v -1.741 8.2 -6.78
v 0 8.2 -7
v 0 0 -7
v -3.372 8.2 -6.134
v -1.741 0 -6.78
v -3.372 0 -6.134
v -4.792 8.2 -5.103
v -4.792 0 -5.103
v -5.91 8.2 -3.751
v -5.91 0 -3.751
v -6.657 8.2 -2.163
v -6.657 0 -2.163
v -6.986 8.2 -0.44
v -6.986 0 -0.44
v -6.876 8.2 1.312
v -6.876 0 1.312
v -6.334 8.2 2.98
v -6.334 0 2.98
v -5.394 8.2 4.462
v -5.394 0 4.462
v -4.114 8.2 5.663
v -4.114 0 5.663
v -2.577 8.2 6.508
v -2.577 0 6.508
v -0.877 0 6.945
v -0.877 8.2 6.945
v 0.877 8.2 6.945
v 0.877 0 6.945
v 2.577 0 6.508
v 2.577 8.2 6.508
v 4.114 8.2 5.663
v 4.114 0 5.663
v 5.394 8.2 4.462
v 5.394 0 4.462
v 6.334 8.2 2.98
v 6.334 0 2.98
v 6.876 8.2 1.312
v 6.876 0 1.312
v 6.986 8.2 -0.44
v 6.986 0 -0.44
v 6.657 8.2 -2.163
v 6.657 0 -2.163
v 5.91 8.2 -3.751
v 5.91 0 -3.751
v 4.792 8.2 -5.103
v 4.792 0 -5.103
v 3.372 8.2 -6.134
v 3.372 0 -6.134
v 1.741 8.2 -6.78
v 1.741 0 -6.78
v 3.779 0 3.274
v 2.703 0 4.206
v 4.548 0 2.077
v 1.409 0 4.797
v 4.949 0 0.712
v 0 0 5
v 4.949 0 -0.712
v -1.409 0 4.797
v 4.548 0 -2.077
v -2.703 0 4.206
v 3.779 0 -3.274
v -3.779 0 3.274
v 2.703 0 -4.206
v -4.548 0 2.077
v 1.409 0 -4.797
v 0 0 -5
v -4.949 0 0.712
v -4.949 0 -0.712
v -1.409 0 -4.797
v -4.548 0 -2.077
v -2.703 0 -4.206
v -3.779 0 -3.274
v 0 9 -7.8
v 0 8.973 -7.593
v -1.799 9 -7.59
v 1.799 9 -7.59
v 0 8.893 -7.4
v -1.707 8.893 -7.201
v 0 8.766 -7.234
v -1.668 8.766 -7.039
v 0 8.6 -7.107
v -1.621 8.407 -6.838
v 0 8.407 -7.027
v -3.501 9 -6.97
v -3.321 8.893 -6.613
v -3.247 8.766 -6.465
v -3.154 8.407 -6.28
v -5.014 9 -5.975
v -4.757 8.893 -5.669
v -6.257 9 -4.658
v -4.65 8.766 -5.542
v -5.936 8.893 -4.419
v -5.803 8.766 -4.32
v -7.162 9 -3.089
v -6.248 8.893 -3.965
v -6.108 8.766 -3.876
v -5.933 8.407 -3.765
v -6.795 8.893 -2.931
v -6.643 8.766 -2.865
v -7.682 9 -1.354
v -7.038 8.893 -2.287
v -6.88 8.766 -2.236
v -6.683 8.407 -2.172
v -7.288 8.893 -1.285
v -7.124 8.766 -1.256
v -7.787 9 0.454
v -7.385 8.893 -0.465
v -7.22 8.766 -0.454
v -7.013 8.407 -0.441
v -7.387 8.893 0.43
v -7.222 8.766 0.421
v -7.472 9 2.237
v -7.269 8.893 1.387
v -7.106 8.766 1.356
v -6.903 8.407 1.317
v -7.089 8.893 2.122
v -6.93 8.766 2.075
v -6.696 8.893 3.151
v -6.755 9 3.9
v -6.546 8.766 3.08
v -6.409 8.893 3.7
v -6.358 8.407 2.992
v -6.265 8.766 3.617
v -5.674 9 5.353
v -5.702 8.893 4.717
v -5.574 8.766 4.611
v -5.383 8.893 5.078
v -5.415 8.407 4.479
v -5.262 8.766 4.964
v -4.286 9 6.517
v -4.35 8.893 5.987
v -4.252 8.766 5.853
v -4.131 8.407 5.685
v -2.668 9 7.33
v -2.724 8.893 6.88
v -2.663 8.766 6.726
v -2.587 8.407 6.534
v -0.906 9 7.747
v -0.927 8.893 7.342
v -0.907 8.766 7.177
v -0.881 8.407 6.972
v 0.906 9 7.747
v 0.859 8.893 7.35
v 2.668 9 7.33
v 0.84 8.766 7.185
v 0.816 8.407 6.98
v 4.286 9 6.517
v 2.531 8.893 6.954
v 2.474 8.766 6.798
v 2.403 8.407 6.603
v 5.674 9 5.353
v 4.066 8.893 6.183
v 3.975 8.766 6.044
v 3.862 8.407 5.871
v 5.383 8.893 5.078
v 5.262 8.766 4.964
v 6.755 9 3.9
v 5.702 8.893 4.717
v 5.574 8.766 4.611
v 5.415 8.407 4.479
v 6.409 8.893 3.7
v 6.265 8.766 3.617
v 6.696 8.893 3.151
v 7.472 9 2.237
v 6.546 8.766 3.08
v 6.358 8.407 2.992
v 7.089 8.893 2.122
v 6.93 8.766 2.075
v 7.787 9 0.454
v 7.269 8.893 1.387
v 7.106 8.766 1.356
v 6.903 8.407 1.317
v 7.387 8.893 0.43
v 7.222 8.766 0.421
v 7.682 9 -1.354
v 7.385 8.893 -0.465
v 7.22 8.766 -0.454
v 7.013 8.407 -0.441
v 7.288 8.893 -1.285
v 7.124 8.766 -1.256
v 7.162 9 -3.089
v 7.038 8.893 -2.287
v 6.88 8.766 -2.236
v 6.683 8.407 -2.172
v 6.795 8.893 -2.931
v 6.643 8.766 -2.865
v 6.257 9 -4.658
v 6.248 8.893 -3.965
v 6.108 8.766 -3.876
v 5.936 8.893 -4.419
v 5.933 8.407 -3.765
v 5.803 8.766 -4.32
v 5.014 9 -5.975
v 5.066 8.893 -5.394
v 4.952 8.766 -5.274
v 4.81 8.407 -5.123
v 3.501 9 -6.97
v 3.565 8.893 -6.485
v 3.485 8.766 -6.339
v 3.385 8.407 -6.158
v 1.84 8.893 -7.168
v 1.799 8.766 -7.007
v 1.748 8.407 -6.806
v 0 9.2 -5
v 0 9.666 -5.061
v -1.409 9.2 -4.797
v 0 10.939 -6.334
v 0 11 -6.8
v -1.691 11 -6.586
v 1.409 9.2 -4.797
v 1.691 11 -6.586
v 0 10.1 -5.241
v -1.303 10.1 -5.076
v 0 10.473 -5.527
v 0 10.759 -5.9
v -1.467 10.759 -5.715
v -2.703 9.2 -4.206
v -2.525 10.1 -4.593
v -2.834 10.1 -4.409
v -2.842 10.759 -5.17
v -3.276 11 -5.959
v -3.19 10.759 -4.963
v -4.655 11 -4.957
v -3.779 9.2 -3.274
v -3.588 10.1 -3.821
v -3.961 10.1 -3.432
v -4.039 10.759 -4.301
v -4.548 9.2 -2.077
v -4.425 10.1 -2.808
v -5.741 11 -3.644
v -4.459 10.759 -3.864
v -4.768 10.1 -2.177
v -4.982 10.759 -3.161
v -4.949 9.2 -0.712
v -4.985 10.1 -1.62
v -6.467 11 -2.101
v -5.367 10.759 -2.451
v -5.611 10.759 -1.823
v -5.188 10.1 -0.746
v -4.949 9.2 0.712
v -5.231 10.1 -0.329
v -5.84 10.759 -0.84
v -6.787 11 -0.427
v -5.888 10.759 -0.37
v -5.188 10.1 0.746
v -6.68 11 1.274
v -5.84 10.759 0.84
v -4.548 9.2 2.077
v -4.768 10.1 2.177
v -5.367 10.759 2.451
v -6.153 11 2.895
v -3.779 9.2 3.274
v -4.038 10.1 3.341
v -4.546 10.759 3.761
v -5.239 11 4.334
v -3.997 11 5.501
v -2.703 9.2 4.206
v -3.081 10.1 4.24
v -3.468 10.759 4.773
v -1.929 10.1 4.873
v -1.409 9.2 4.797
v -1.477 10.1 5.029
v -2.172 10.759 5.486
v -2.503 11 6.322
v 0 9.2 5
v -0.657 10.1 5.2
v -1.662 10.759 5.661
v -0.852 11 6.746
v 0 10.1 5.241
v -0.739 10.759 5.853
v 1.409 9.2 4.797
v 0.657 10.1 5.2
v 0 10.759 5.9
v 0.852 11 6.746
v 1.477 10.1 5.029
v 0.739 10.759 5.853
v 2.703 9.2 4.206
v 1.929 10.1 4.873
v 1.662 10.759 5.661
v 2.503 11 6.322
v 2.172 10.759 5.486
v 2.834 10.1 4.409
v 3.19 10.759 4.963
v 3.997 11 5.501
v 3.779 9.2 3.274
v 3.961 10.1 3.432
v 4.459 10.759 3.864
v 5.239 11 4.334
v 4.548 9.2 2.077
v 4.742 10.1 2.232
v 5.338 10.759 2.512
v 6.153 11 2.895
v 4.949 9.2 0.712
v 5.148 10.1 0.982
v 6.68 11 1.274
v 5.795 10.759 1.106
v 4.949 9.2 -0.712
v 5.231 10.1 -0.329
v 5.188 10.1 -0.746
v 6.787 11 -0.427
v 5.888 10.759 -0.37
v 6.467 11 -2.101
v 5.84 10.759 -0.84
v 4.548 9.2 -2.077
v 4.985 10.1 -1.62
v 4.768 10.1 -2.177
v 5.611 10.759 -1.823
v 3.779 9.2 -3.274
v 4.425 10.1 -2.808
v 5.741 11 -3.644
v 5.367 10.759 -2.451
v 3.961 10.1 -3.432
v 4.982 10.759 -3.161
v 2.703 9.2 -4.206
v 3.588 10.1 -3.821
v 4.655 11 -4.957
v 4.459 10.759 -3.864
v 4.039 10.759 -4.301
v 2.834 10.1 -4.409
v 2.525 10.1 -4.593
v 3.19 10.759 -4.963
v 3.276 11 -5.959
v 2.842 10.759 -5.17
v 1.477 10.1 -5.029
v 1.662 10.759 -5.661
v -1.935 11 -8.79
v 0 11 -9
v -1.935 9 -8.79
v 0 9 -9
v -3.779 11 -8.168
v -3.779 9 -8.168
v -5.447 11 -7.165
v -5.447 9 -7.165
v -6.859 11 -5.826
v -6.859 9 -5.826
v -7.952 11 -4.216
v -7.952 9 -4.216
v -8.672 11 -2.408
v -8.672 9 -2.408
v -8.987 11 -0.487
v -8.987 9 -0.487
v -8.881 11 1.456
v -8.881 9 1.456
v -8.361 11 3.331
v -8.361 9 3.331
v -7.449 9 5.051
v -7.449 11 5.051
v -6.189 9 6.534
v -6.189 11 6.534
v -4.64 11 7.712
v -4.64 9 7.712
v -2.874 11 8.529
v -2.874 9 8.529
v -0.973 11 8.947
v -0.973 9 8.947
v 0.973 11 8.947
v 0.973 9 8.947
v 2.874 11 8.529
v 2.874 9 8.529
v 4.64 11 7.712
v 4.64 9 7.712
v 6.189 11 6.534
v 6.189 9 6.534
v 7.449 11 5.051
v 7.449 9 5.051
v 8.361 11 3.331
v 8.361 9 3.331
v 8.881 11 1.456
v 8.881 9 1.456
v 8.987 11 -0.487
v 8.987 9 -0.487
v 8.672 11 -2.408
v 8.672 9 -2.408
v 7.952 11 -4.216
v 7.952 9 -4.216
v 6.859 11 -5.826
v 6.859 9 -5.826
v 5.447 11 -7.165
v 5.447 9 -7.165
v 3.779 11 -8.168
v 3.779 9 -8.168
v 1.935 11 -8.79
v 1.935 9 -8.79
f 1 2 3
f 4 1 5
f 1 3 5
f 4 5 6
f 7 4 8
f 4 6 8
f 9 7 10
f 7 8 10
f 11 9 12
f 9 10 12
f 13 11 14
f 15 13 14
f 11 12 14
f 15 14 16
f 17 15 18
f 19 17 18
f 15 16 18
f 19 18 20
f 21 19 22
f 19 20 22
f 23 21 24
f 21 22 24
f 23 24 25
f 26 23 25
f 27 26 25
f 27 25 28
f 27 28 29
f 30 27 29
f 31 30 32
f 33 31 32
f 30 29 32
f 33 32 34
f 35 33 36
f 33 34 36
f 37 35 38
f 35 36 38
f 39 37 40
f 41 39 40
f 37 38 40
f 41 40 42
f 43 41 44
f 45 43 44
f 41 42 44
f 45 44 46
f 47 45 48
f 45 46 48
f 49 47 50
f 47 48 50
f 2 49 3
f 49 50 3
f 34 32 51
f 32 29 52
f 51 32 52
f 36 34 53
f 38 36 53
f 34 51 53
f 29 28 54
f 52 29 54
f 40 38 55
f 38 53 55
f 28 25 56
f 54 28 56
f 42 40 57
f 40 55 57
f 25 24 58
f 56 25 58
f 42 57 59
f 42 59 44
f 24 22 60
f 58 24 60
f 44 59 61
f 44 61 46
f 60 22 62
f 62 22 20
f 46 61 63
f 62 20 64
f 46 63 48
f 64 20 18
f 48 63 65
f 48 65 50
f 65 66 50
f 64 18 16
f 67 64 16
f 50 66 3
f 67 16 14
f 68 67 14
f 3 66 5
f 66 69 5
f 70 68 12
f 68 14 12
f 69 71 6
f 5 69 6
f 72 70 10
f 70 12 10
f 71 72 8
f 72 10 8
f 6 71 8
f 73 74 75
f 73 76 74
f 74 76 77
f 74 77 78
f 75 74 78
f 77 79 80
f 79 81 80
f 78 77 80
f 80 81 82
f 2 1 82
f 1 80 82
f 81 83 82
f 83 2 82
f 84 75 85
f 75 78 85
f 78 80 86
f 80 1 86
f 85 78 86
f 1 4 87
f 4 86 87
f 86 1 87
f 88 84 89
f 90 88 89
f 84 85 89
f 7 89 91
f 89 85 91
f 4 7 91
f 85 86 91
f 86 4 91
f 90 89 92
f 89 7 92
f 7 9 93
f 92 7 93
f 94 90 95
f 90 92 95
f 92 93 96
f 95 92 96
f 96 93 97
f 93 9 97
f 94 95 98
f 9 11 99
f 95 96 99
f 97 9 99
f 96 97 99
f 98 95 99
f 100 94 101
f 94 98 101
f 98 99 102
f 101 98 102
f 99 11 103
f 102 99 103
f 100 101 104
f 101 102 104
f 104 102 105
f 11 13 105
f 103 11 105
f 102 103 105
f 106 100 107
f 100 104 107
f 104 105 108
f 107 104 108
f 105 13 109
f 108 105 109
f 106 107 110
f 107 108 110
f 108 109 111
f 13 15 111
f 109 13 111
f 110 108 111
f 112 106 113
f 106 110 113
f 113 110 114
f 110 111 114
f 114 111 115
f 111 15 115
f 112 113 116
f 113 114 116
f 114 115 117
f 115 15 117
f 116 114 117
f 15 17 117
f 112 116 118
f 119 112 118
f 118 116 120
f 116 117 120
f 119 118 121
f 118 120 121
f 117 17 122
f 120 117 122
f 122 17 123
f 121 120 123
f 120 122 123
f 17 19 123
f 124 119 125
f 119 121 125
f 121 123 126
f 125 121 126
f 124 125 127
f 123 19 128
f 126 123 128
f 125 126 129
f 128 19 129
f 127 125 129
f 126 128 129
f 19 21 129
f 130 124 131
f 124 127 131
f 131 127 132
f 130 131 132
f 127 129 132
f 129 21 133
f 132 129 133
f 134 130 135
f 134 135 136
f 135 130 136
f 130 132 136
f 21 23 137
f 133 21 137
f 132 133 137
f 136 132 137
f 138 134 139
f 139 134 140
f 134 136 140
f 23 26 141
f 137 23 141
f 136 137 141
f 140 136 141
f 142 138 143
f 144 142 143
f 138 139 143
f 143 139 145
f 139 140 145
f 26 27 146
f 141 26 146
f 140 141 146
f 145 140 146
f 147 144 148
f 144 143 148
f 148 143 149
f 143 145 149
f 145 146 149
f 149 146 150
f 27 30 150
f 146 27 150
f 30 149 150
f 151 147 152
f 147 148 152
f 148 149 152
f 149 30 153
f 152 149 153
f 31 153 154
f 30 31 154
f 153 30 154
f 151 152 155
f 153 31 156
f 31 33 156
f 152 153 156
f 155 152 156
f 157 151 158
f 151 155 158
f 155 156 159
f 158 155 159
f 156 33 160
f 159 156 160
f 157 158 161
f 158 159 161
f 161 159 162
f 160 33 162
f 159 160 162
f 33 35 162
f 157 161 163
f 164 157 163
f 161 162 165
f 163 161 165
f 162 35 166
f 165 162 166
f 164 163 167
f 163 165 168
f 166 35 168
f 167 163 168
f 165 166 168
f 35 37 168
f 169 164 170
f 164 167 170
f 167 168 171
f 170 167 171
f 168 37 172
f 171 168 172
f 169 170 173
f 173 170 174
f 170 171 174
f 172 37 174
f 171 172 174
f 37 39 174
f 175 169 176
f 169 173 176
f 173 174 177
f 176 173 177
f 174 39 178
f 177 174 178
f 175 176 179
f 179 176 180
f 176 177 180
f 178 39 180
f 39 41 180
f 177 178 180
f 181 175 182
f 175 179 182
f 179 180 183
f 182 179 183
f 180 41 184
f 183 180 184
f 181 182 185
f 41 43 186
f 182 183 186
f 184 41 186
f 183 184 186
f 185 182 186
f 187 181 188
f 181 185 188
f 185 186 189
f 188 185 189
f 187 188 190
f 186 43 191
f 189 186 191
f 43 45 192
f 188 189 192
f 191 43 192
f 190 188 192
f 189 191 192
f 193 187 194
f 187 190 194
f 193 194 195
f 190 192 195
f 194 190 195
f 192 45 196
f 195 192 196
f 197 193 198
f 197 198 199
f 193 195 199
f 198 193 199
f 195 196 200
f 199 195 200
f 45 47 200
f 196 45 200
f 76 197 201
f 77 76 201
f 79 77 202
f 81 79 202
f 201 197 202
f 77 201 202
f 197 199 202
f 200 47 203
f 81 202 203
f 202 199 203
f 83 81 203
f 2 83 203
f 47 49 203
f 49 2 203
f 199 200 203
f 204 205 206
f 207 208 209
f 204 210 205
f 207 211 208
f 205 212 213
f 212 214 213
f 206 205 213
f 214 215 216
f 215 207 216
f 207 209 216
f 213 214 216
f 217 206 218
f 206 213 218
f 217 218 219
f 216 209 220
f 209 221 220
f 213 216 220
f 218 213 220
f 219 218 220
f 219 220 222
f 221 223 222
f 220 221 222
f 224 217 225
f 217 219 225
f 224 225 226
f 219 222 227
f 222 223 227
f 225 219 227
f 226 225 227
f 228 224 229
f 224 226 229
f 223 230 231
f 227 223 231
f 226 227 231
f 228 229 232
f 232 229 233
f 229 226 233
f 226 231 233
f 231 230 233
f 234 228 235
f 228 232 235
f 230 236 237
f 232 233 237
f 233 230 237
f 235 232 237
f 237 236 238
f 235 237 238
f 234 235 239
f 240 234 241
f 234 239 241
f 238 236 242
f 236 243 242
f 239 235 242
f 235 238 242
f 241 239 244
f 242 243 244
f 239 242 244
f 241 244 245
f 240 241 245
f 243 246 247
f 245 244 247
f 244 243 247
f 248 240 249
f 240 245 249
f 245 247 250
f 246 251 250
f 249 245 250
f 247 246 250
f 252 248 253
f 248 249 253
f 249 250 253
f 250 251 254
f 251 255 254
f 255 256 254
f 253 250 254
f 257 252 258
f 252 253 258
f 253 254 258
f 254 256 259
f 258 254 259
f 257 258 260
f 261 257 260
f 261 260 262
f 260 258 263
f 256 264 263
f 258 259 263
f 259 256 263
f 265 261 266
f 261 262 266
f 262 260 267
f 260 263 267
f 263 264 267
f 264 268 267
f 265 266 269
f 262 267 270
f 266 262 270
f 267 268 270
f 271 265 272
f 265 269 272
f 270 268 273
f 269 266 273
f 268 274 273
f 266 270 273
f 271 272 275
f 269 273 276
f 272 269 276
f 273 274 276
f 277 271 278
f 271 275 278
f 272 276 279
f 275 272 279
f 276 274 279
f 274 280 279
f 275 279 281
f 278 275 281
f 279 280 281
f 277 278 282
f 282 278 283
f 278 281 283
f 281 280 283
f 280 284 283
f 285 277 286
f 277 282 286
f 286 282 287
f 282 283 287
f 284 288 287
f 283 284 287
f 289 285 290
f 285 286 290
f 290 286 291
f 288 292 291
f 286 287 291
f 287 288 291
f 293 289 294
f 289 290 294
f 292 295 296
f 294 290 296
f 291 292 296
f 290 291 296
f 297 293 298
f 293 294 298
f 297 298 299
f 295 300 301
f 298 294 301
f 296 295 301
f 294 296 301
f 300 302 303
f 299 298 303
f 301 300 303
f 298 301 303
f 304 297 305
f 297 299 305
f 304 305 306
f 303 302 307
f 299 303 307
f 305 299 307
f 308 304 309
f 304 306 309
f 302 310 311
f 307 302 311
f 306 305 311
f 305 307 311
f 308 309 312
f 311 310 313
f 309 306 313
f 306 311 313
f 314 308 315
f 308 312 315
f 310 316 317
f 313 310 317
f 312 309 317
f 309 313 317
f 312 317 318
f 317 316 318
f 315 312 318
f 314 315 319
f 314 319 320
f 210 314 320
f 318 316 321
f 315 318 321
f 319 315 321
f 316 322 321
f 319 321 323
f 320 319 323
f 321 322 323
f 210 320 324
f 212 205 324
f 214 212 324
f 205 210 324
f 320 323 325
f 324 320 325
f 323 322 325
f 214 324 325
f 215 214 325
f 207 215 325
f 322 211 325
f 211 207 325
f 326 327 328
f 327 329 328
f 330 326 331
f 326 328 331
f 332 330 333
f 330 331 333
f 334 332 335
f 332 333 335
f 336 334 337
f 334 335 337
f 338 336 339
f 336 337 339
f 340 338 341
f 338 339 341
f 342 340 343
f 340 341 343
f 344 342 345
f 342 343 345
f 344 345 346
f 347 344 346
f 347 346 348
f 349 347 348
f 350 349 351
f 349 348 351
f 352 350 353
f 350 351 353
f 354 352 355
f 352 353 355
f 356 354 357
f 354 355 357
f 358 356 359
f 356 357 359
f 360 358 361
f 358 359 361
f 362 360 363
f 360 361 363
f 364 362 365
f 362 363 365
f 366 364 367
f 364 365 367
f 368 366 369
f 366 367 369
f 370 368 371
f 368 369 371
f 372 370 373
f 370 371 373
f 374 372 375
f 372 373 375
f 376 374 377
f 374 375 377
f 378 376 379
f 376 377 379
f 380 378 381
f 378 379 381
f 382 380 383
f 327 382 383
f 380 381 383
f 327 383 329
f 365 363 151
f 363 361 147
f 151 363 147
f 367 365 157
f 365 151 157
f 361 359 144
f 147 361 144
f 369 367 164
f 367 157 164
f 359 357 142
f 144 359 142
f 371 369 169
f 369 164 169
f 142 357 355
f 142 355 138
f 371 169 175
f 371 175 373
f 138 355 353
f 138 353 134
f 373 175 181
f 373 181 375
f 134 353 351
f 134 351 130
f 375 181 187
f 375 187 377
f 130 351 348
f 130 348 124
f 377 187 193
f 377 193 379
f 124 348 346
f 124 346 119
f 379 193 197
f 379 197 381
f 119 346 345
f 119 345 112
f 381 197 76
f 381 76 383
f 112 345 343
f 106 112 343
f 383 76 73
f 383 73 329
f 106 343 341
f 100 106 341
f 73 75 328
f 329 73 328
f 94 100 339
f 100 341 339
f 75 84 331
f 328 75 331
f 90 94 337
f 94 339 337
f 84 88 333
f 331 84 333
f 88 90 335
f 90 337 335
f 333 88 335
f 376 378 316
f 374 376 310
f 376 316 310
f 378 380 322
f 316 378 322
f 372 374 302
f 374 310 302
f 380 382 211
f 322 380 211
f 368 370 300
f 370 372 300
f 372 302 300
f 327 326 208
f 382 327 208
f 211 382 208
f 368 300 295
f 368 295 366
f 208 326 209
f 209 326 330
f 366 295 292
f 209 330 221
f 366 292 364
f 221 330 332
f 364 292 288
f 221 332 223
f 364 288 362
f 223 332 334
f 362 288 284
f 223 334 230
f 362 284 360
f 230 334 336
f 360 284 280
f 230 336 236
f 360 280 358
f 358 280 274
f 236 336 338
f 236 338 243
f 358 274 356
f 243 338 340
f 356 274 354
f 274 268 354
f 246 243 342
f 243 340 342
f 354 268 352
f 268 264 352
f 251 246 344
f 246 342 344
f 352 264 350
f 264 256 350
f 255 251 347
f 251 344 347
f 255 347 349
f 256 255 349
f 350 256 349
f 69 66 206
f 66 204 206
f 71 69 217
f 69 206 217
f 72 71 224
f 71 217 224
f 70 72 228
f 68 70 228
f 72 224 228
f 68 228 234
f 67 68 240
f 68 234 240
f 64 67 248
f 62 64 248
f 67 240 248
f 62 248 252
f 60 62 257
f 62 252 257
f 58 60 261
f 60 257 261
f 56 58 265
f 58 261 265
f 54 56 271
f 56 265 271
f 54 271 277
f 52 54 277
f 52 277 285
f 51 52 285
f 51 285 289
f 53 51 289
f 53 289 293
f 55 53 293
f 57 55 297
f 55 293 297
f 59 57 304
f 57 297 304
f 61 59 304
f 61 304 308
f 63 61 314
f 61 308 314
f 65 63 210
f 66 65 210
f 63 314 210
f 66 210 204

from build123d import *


with BuildPart() as part:
    # Esquisse1 → Base-Révolution (revolve)
    with BuildSketch(Plane.XY, mode=Mode.PRIVATE) as base_r_volution_sk:
        with BuildLine():
            Line((5, 0), (5, 9.2))
            ThreePointArc((5, 9.2), (5.527207794, 10.472792206), (6.8, 11))
            Line((6.8, 11), (9, 11))
            Line((9, 11), (9, 9))
            Line((9, 9), (7.8, 9))
            ThreePointArc((7.8, 9), (7.234314575, 8.765685425), (7, 8.2))
            Line((7, 8.2), (7, 0))
            Line((7, 0), (5, 0))
        make_face()
    revolve(base_r_volution_sk.sketch.rotate(Axis((0, 0, 0), (0, 1, 0)), 90), axis=Axis((0, 0, 0), (0, 1, 0)))


solid = part.part
